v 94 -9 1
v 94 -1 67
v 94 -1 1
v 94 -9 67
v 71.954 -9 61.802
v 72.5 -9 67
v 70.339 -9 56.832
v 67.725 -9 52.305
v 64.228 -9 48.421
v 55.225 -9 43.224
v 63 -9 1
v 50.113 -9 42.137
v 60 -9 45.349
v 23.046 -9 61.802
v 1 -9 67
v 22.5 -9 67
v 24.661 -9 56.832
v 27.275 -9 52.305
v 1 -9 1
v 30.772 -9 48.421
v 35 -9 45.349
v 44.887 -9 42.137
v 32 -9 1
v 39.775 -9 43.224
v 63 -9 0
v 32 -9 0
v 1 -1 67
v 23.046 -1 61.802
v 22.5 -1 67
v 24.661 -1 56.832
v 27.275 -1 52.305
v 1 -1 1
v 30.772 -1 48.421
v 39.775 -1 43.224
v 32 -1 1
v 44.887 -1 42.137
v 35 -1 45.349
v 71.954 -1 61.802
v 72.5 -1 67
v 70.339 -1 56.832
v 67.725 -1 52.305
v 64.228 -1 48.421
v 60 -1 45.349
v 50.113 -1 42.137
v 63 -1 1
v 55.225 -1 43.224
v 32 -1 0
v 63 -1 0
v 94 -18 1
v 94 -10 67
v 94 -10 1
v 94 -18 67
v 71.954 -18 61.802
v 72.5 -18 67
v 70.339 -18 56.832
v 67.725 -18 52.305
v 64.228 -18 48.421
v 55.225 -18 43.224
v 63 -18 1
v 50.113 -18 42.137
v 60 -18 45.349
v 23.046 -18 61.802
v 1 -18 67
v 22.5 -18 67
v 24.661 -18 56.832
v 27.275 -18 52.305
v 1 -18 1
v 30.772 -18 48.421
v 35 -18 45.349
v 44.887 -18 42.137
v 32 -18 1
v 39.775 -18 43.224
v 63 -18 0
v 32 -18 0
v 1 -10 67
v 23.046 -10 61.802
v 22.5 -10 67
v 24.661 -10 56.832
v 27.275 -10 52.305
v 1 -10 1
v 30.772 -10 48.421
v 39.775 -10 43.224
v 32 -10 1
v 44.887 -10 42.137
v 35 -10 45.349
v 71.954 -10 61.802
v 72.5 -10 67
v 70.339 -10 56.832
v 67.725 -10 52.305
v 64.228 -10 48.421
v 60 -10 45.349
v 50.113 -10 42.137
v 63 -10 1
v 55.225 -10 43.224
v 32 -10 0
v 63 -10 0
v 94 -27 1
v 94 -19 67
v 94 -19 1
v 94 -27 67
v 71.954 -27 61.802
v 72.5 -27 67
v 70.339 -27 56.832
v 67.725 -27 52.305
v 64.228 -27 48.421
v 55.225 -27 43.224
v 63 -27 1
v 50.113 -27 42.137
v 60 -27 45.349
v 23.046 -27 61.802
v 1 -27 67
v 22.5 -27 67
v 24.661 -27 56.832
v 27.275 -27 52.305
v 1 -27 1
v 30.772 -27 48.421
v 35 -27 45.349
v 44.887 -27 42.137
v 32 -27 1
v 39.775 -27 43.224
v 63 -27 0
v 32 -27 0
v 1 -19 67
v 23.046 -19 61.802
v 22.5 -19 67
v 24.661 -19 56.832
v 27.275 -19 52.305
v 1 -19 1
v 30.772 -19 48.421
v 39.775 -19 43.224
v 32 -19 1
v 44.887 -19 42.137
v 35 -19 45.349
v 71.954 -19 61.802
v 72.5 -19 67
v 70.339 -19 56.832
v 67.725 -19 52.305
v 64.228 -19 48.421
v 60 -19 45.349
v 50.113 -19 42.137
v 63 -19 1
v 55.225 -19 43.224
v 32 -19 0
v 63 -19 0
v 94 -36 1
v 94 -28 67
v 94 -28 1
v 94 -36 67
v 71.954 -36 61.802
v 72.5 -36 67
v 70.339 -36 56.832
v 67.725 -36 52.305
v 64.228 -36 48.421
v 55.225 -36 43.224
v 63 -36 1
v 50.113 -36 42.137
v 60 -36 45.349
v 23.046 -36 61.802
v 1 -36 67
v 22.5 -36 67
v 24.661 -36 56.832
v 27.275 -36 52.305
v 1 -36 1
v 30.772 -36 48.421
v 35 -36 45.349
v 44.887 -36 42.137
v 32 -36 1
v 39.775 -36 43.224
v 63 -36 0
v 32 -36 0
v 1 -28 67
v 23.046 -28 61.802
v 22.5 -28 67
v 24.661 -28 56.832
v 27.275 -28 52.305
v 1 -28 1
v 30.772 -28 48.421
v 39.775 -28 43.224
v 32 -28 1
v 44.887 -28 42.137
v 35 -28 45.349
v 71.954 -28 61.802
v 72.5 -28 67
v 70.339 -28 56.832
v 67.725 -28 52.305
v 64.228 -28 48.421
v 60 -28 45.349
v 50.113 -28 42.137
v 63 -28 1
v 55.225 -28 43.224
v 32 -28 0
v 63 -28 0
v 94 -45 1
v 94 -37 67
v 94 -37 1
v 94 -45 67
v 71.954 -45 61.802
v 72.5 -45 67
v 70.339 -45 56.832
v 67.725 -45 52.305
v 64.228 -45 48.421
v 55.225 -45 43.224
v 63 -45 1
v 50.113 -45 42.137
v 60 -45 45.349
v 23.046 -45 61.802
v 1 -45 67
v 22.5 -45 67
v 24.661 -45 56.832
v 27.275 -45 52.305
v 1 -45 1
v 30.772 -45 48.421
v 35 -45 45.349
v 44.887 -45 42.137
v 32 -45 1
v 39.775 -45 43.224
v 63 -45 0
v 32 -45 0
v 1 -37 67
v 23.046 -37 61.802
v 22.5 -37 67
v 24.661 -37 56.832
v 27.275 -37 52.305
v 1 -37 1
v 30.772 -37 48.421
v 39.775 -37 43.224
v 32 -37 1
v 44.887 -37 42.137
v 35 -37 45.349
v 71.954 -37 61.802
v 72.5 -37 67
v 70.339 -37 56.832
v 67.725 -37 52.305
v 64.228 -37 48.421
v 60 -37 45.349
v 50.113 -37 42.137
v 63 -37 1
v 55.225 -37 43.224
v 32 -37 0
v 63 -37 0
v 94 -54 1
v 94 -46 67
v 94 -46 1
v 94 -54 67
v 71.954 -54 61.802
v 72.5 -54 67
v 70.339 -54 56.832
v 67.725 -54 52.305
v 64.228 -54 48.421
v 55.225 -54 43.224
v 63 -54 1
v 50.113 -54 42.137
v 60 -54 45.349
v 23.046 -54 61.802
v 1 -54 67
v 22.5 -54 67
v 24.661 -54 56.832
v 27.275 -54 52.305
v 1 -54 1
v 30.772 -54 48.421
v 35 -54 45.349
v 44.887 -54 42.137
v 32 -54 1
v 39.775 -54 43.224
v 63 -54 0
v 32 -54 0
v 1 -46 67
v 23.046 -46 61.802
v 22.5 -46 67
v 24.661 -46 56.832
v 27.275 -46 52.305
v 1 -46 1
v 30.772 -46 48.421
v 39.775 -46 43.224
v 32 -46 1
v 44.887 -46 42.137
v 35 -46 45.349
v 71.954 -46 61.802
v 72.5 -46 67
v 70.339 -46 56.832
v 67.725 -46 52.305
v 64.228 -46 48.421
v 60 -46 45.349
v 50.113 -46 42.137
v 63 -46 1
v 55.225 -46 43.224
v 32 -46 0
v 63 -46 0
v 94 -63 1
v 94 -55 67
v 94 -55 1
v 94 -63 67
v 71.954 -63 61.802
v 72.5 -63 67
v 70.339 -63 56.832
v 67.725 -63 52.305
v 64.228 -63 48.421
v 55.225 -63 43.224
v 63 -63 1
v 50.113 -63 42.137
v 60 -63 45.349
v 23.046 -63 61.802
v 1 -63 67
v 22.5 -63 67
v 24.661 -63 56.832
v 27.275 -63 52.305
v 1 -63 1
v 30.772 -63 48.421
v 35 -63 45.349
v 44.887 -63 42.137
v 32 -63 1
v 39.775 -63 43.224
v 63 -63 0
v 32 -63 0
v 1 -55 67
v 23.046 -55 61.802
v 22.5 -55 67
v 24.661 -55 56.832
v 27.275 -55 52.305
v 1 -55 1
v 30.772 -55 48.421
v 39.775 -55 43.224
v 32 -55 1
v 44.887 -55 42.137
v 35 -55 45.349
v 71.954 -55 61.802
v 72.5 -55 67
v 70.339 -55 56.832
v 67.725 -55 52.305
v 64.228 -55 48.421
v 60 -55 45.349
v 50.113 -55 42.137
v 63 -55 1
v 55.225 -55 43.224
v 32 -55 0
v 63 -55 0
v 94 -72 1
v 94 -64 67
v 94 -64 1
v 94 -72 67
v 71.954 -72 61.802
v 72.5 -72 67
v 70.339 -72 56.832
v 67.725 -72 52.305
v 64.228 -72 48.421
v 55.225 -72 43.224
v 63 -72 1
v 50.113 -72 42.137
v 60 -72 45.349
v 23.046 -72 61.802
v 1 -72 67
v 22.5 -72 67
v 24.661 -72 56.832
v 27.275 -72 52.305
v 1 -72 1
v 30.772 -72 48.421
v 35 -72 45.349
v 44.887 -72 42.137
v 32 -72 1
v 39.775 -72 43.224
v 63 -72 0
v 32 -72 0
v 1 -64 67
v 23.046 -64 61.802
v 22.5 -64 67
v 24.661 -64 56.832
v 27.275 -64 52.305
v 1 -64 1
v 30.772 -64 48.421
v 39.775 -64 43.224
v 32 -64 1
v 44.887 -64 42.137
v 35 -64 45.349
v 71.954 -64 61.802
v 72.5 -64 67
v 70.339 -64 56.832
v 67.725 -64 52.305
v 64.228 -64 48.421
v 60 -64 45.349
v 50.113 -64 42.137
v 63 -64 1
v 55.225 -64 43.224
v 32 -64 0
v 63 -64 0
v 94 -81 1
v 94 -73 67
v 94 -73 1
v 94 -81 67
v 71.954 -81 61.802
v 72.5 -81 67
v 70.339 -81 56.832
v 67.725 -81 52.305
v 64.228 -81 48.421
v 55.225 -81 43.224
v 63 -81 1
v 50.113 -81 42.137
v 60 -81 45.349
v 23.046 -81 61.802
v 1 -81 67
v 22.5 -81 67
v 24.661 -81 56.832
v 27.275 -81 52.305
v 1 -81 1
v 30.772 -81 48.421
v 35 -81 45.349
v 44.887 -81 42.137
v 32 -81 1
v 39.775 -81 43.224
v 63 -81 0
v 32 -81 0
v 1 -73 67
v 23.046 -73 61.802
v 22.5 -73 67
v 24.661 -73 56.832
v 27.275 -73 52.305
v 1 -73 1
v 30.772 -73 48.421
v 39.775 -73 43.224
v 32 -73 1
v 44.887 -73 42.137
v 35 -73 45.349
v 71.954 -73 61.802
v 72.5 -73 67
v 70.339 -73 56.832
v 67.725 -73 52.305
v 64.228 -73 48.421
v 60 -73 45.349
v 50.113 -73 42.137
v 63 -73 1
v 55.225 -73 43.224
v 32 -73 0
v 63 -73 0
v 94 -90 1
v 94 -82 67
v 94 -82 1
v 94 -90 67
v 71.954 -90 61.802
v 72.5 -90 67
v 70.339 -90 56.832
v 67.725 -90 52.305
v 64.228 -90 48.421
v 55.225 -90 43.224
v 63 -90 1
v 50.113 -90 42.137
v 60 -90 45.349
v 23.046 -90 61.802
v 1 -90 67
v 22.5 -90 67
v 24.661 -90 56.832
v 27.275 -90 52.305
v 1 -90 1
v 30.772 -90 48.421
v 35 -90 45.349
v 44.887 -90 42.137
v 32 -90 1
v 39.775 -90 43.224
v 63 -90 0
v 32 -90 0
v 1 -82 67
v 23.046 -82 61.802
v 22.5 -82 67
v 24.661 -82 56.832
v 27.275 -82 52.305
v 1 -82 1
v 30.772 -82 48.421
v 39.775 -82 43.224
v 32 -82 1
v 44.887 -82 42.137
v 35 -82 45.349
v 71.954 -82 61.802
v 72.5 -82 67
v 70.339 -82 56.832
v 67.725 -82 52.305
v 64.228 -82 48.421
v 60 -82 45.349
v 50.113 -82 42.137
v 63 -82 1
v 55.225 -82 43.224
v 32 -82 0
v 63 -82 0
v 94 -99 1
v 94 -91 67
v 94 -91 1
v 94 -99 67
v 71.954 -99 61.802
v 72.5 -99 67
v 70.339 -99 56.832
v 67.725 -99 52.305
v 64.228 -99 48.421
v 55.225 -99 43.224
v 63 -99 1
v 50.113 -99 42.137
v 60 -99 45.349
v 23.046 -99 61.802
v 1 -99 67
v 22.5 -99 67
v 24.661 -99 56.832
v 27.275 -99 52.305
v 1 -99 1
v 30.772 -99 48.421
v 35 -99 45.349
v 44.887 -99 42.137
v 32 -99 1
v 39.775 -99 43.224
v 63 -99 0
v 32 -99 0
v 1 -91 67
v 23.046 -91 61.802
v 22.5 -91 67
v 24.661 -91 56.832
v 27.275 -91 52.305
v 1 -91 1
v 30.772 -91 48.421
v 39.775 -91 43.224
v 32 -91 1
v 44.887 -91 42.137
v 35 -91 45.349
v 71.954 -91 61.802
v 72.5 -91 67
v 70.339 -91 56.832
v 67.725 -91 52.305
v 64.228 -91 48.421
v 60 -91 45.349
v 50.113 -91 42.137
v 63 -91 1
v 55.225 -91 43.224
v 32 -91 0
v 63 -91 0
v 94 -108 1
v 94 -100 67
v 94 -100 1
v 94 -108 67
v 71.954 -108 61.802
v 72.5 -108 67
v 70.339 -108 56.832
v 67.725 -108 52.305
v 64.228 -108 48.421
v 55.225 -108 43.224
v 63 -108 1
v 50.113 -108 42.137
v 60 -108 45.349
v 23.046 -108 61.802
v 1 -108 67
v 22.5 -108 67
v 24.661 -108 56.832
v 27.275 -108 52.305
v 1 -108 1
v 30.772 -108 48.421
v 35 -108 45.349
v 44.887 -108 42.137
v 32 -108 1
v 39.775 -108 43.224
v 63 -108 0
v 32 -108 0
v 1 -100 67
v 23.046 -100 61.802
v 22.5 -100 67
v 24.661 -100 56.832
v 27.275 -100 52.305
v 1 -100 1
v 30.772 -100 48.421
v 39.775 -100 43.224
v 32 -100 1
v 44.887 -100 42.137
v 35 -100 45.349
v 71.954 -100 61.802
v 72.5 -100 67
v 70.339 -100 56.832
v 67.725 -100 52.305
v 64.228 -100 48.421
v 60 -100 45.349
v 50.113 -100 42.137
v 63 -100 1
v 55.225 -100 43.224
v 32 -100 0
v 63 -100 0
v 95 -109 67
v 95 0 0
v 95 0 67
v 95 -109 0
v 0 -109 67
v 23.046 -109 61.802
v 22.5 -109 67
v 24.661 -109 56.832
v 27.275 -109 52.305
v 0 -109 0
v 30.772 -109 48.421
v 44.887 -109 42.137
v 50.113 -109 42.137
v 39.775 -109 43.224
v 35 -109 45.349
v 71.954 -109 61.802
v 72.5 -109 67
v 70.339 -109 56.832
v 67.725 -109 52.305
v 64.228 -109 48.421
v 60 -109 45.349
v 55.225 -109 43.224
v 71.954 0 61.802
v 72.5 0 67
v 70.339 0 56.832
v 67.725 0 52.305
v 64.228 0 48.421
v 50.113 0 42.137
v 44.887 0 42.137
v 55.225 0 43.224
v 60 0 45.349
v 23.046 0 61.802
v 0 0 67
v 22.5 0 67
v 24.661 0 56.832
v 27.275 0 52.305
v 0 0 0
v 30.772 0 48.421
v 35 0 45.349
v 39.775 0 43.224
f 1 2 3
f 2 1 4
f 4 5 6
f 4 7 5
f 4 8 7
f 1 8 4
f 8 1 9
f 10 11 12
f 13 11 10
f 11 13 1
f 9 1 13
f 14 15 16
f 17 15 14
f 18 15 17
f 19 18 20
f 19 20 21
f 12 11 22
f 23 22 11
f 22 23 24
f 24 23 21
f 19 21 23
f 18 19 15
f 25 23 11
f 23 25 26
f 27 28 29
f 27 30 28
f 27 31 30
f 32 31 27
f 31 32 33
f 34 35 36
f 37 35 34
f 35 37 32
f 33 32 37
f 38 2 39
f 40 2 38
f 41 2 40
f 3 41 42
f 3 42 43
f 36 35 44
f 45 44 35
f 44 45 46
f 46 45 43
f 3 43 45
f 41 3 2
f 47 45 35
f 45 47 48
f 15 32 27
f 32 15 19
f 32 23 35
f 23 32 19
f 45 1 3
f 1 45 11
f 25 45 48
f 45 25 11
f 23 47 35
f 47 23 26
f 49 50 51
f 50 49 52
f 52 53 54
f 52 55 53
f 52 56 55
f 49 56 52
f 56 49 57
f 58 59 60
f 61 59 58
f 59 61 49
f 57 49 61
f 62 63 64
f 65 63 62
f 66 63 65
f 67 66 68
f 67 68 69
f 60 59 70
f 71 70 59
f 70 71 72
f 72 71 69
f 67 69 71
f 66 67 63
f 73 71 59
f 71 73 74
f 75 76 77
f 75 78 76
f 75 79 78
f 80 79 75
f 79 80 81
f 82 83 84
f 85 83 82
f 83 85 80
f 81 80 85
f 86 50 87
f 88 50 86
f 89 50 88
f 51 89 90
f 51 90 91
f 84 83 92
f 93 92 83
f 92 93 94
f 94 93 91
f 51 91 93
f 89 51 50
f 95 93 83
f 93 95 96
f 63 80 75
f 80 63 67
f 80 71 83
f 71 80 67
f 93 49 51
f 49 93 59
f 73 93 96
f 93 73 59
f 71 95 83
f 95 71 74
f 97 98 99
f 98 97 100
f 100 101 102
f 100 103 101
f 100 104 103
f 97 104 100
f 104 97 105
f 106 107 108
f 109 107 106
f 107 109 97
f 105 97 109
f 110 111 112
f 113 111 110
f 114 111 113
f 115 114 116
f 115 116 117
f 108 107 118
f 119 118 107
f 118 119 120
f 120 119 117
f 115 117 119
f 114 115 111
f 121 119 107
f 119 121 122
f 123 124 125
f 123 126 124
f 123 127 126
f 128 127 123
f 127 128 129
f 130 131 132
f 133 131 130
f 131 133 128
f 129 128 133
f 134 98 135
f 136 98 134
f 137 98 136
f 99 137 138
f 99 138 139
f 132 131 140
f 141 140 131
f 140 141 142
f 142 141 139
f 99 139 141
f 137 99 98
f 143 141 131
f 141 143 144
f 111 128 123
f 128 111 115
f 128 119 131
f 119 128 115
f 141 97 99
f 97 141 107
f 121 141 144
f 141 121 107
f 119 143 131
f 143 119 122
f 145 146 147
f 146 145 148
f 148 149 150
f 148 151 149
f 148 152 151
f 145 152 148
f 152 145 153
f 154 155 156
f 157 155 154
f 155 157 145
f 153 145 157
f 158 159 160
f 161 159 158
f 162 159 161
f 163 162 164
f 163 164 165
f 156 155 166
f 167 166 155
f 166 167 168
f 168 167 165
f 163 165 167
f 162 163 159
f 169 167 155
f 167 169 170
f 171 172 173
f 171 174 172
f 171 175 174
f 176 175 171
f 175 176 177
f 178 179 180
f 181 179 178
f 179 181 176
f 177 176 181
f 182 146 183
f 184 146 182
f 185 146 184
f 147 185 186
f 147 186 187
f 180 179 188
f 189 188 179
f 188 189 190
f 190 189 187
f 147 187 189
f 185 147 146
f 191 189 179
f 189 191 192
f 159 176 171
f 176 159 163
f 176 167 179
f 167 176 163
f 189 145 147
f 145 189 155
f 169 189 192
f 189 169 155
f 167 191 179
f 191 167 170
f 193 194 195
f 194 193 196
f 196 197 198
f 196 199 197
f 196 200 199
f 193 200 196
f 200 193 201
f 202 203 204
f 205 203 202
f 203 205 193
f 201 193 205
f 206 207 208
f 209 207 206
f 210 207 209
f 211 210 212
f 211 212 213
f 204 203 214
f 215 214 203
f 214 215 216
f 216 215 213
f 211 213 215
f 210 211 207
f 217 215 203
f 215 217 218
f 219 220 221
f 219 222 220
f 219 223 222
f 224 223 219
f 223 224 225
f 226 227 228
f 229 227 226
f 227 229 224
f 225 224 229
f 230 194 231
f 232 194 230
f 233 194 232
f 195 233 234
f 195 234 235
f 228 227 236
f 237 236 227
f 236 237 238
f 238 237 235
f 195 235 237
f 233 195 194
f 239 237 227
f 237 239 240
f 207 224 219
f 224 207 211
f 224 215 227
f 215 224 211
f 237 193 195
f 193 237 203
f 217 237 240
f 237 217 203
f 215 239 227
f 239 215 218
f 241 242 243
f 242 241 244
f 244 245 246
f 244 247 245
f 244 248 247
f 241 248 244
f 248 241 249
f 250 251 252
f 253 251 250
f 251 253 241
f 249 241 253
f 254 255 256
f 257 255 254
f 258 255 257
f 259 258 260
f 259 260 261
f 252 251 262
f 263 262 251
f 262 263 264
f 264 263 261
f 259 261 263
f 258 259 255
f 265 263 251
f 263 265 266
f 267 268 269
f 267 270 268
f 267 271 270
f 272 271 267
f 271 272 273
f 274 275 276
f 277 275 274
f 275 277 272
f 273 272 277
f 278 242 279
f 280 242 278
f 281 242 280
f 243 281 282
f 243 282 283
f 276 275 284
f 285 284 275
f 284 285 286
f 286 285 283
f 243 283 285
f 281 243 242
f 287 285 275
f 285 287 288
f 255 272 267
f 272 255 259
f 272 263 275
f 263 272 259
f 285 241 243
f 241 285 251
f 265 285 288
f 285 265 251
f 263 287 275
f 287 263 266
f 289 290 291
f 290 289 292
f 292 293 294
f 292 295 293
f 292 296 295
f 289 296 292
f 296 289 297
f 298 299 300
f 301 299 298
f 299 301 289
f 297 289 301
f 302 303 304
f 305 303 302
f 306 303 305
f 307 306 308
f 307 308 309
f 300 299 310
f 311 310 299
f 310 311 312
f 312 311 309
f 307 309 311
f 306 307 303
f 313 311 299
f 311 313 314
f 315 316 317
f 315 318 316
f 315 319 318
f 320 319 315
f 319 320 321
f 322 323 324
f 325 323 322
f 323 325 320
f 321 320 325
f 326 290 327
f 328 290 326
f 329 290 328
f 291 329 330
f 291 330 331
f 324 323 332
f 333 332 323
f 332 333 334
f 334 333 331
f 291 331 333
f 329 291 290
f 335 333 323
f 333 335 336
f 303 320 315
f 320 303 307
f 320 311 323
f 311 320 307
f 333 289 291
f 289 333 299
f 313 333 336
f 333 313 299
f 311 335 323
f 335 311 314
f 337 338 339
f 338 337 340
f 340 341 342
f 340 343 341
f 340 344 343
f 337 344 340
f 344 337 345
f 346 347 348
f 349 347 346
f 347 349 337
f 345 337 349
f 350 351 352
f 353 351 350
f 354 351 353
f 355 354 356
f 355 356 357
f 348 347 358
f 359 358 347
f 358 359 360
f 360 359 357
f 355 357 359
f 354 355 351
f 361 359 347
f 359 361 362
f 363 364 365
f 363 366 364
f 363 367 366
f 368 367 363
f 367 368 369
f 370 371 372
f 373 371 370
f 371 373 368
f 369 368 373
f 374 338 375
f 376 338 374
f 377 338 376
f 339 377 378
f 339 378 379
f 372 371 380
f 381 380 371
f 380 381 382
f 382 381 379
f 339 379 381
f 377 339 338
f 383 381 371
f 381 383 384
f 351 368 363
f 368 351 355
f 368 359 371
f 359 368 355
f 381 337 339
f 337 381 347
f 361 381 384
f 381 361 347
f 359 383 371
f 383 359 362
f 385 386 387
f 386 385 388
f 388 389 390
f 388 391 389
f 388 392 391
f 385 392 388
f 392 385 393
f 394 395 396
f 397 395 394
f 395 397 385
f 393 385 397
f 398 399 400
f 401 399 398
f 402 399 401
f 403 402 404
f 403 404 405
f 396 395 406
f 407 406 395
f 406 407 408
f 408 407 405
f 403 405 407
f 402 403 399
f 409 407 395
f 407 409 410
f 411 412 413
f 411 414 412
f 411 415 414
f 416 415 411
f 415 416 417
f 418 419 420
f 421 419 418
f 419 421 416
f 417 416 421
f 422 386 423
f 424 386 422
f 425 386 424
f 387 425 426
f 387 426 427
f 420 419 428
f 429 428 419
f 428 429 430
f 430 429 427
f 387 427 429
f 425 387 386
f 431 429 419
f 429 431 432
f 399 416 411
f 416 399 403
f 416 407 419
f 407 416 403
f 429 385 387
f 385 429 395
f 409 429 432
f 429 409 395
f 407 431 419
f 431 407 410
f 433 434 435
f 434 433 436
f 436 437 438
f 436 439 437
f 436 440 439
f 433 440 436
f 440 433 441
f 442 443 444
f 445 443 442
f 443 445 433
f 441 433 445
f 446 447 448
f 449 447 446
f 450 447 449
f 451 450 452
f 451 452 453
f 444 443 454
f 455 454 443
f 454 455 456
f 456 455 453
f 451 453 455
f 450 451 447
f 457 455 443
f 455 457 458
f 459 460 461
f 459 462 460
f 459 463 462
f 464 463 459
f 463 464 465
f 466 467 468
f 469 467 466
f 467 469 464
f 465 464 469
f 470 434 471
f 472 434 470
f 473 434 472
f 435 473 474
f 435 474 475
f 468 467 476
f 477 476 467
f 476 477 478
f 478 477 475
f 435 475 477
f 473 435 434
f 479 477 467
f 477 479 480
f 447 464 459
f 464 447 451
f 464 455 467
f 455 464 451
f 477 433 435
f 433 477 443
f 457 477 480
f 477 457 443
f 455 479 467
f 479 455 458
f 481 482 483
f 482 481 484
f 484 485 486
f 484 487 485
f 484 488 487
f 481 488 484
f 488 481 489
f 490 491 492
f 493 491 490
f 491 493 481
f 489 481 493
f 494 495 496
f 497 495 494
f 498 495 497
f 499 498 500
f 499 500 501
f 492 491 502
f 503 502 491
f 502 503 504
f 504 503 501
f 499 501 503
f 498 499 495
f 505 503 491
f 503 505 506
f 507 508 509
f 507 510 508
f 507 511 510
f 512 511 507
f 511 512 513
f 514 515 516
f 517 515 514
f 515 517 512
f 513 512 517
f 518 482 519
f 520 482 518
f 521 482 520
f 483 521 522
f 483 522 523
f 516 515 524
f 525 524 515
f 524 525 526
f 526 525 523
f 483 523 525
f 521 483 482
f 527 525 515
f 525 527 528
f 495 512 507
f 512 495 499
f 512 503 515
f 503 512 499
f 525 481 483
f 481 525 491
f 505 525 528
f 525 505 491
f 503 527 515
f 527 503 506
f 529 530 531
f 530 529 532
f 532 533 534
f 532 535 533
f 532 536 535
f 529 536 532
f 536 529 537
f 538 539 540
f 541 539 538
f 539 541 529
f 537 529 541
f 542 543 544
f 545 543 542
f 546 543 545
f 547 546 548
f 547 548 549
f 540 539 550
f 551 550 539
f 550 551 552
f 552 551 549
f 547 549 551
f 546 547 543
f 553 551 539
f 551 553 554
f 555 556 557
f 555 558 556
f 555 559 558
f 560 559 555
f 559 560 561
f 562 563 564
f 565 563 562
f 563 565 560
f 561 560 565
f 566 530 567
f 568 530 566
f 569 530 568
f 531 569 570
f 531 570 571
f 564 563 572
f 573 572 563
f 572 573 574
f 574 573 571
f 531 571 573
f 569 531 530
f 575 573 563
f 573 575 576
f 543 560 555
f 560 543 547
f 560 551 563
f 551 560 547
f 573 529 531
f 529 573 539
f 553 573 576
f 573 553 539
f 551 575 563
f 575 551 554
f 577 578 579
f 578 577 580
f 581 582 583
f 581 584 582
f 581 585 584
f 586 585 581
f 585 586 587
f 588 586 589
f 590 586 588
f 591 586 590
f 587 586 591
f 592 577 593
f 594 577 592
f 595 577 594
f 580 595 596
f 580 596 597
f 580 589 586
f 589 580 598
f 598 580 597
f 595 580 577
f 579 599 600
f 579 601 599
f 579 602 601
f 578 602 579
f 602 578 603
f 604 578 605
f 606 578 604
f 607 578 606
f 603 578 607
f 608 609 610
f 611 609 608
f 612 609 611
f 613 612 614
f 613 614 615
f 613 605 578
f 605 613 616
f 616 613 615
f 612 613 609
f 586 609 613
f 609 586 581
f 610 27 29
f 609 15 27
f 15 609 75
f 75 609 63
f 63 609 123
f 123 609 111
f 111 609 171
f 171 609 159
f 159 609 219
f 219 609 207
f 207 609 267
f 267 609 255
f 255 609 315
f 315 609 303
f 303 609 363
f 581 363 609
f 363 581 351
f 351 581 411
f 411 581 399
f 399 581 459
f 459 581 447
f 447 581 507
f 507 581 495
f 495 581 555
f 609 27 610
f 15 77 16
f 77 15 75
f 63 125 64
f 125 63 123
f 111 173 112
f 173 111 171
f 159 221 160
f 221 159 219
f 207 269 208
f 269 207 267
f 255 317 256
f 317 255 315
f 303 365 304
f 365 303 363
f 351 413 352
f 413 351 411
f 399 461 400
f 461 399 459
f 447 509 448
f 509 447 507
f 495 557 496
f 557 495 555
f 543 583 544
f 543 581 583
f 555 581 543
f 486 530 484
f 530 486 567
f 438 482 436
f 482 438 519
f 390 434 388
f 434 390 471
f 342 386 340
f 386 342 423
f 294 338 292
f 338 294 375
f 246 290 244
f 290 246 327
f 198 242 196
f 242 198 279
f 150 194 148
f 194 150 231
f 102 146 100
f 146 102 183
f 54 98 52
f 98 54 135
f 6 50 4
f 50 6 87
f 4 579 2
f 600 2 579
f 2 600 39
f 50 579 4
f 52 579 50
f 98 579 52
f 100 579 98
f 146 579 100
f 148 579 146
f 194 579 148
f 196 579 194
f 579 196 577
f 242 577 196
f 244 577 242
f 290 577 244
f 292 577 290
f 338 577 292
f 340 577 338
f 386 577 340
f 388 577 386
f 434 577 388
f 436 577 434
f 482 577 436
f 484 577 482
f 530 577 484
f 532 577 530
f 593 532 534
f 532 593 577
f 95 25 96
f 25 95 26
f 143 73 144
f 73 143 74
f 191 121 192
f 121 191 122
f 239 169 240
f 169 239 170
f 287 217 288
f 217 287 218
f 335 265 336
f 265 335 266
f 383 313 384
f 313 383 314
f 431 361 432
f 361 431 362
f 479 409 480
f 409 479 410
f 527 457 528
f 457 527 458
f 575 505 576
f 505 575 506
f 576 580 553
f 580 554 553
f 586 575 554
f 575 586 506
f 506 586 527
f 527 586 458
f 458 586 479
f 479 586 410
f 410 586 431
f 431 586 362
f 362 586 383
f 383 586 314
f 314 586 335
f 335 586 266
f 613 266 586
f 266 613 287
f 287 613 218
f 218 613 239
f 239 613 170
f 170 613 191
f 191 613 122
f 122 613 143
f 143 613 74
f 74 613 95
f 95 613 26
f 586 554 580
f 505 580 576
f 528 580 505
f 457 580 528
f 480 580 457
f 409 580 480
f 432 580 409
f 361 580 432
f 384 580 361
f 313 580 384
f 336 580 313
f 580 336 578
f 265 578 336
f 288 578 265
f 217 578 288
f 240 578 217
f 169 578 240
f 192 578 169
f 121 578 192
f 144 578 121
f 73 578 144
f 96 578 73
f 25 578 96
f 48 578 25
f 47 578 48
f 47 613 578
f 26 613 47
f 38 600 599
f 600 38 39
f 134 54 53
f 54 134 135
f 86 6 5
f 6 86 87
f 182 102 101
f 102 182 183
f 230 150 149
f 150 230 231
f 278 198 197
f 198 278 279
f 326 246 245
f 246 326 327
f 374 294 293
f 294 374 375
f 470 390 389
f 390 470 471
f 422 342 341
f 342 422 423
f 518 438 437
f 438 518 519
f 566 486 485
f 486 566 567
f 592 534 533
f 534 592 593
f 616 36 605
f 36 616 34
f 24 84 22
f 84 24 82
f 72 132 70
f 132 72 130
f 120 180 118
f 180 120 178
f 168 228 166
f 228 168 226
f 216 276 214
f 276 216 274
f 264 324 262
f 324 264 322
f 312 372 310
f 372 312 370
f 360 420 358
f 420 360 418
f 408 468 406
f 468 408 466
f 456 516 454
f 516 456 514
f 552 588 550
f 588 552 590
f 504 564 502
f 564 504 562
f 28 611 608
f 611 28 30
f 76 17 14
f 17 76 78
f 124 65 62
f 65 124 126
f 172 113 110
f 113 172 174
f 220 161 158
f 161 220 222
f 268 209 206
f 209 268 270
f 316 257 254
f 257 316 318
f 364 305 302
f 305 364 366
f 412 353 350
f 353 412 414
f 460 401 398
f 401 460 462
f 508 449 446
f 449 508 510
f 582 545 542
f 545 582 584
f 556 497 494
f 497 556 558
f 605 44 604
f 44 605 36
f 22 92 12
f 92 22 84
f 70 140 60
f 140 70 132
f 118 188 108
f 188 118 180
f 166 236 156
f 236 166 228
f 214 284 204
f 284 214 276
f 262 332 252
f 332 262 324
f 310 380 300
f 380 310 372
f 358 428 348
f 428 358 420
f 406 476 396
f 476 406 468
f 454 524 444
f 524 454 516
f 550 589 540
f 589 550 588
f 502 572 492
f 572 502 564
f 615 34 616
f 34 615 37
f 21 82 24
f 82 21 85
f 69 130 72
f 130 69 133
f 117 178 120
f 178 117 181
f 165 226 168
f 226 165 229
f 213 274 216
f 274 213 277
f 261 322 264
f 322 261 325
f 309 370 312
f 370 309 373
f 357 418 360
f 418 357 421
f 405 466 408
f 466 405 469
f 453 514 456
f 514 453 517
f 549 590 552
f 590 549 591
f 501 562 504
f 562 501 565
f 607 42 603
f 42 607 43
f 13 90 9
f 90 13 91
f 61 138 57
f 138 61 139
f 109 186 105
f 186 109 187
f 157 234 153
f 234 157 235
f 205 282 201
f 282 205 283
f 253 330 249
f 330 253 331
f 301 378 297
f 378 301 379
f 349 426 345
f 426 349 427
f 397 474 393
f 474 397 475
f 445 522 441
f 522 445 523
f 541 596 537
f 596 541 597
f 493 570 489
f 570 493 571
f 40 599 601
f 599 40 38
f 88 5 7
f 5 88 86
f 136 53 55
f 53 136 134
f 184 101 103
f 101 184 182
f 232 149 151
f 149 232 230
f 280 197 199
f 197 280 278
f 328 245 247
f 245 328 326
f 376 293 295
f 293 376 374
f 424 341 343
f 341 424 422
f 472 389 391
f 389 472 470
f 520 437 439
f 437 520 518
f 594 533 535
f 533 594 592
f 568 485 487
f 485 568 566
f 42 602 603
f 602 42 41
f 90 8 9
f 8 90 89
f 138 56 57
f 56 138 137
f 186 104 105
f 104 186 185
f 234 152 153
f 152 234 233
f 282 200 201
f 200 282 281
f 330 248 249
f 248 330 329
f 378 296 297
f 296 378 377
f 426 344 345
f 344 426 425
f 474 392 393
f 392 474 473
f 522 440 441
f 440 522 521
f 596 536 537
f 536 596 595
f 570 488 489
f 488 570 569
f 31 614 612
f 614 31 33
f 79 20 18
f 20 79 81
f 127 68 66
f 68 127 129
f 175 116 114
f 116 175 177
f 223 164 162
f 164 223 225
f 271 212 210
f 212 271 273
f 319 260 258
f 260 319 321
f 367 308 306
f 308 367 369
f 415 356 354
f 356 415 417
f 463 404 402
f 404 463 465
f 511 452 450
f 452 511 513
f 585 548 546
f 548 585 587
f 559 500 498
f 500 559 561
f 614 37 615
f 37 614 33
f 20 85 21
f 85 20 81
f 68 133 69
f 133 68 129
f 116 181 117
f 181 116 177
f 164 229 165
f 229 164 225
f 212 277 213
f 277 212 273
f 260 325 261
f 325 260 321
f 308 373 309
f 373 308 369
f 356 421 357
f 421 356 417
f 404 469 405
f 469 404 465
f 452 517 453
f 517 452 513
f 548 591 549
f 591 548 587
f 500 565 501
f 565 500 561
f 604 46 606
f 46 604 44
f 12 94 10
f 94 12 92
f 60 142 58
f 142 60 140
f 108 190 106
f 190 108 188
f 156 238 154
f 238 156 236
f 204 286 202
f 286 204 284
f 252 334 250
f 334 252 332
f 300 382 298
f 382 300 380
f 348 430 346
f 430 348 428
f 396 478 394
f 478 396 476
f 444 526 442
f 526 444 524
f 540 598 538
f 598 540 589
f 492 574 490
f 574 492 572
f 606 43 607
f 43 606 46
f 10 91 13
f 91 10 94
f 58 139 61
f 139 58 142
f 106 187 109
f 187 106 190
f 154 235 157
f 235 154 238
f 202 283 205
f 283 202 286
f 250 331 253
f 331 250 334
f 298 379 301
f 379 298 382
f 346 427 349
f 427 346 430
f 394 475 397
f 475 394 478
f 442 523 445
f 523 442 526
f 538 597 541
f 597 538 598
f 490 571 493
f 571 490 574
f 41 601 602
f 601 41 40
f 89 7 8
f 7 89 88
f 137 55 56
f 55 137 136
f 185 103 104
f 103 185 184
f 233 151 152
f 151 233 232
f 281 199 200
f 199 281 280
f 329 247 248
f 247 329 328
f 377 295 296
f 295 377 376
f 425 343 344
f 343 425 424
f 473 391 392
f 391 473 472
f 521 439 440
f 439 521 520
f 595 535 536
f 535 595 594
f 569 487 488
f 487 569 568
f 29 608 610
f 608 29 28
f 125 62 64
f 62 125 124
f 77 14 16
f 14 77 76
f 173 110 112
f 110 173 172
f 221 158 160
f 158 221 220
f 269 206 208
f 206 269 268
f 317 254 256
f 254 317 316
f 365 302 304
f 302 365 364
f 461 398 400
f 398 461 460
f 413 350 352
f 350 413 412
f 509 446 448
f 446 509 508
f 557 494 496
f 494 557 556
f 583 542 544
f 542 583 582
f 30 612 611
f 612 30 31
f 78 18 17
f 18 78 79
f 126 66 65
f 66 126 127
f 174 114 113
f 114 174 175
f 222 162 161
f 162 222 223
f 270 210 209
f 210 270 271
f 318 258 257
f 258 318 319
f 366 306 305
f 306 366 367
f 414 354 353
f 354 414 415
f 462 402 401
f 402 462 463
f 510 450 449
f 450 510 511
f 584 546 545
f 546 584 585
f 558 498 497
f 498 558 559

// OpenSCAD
// Dice Settlers

floorDepth = 1;
wall = 1;
wallFront = 1.2;
slop = 1; // 1.4;
cardThick = 12.6/40;

function sum(margin,list,stop,thick) =
    margin + thick*abs(list[stop]) + (stop? sum(margin,list,stop-1,thick) : 0);

function computeDepth(list) = sum(1 + 1,list,len(list)-1,cardThick) + wallFront;

module hexTray() {
    tokenThick = 1; // 2.52; //19.6/8; // 2.4;
    wells =  [-19.6,     -48.1, -20.2,   -15.1,   -20.6];
    labels = ["01-07a","08-26","27-34","35-40","41/Sea"];
    tokenSlop = 0.4;
    totalHeight = sum(wall + tokenSlop,wells,len(wells)-1,tokenThick) + wall;
    echo(totalHeight);
    d=69;
    d2=69;
    difference() {
        cube([d+wall+wall,d*.5,totalHeight]);
        for (i=[0:len(wells)-1]) {
            echo(labels[i]);
            thisThick = tokenThick * abs(wells[i]) + tokenSlop;
            translate([wall,floorDepth,wall+(i?sum(wall+tokenSlop,wells,i-1,tokenThick):0)]) {
                translate([d/2,d/2-4,0]) 
                    cylinder(h=thisThick,d=(wells[i]>0?d:d2),$fn=(wells[i]>0)?60:6);
                translate([0,d/2-4,0]) cube([d,99,thisThick]);
                
                translate([d/2,-0.4,thisThick/2]) rotate([-90,180,0]) linear_extrude(5) 
                    text(labels[i],size=6,halign="center",valign="center");
            }
            
        }
     }
}

module cardTray() {
    difference() {
        slots = 12;
        size = 8;
        depth = (size + wall) * slots + wall;
        cube([93+wall*2,66 + wall,depth]);
        for (i=[0:slots-1]) {
            translate([wall,wall,wall + i * (size + wall)]) {
                cube([93,99,8]);
                translate([31,-wall*2,0]) cube([31,wall*4,size]);
            }
        }
        translate([(93+wall*2)/2,66+wall,-1]) cylinder(h=depth*2,d=50);
        //translate([0,0,-1]) rotate([0,0,45]) cube([30,30,depth*3],center=true);
    }
}


//rotate([90,0,0]) hexTray();

rotate([90,0,0]) cardTray();
